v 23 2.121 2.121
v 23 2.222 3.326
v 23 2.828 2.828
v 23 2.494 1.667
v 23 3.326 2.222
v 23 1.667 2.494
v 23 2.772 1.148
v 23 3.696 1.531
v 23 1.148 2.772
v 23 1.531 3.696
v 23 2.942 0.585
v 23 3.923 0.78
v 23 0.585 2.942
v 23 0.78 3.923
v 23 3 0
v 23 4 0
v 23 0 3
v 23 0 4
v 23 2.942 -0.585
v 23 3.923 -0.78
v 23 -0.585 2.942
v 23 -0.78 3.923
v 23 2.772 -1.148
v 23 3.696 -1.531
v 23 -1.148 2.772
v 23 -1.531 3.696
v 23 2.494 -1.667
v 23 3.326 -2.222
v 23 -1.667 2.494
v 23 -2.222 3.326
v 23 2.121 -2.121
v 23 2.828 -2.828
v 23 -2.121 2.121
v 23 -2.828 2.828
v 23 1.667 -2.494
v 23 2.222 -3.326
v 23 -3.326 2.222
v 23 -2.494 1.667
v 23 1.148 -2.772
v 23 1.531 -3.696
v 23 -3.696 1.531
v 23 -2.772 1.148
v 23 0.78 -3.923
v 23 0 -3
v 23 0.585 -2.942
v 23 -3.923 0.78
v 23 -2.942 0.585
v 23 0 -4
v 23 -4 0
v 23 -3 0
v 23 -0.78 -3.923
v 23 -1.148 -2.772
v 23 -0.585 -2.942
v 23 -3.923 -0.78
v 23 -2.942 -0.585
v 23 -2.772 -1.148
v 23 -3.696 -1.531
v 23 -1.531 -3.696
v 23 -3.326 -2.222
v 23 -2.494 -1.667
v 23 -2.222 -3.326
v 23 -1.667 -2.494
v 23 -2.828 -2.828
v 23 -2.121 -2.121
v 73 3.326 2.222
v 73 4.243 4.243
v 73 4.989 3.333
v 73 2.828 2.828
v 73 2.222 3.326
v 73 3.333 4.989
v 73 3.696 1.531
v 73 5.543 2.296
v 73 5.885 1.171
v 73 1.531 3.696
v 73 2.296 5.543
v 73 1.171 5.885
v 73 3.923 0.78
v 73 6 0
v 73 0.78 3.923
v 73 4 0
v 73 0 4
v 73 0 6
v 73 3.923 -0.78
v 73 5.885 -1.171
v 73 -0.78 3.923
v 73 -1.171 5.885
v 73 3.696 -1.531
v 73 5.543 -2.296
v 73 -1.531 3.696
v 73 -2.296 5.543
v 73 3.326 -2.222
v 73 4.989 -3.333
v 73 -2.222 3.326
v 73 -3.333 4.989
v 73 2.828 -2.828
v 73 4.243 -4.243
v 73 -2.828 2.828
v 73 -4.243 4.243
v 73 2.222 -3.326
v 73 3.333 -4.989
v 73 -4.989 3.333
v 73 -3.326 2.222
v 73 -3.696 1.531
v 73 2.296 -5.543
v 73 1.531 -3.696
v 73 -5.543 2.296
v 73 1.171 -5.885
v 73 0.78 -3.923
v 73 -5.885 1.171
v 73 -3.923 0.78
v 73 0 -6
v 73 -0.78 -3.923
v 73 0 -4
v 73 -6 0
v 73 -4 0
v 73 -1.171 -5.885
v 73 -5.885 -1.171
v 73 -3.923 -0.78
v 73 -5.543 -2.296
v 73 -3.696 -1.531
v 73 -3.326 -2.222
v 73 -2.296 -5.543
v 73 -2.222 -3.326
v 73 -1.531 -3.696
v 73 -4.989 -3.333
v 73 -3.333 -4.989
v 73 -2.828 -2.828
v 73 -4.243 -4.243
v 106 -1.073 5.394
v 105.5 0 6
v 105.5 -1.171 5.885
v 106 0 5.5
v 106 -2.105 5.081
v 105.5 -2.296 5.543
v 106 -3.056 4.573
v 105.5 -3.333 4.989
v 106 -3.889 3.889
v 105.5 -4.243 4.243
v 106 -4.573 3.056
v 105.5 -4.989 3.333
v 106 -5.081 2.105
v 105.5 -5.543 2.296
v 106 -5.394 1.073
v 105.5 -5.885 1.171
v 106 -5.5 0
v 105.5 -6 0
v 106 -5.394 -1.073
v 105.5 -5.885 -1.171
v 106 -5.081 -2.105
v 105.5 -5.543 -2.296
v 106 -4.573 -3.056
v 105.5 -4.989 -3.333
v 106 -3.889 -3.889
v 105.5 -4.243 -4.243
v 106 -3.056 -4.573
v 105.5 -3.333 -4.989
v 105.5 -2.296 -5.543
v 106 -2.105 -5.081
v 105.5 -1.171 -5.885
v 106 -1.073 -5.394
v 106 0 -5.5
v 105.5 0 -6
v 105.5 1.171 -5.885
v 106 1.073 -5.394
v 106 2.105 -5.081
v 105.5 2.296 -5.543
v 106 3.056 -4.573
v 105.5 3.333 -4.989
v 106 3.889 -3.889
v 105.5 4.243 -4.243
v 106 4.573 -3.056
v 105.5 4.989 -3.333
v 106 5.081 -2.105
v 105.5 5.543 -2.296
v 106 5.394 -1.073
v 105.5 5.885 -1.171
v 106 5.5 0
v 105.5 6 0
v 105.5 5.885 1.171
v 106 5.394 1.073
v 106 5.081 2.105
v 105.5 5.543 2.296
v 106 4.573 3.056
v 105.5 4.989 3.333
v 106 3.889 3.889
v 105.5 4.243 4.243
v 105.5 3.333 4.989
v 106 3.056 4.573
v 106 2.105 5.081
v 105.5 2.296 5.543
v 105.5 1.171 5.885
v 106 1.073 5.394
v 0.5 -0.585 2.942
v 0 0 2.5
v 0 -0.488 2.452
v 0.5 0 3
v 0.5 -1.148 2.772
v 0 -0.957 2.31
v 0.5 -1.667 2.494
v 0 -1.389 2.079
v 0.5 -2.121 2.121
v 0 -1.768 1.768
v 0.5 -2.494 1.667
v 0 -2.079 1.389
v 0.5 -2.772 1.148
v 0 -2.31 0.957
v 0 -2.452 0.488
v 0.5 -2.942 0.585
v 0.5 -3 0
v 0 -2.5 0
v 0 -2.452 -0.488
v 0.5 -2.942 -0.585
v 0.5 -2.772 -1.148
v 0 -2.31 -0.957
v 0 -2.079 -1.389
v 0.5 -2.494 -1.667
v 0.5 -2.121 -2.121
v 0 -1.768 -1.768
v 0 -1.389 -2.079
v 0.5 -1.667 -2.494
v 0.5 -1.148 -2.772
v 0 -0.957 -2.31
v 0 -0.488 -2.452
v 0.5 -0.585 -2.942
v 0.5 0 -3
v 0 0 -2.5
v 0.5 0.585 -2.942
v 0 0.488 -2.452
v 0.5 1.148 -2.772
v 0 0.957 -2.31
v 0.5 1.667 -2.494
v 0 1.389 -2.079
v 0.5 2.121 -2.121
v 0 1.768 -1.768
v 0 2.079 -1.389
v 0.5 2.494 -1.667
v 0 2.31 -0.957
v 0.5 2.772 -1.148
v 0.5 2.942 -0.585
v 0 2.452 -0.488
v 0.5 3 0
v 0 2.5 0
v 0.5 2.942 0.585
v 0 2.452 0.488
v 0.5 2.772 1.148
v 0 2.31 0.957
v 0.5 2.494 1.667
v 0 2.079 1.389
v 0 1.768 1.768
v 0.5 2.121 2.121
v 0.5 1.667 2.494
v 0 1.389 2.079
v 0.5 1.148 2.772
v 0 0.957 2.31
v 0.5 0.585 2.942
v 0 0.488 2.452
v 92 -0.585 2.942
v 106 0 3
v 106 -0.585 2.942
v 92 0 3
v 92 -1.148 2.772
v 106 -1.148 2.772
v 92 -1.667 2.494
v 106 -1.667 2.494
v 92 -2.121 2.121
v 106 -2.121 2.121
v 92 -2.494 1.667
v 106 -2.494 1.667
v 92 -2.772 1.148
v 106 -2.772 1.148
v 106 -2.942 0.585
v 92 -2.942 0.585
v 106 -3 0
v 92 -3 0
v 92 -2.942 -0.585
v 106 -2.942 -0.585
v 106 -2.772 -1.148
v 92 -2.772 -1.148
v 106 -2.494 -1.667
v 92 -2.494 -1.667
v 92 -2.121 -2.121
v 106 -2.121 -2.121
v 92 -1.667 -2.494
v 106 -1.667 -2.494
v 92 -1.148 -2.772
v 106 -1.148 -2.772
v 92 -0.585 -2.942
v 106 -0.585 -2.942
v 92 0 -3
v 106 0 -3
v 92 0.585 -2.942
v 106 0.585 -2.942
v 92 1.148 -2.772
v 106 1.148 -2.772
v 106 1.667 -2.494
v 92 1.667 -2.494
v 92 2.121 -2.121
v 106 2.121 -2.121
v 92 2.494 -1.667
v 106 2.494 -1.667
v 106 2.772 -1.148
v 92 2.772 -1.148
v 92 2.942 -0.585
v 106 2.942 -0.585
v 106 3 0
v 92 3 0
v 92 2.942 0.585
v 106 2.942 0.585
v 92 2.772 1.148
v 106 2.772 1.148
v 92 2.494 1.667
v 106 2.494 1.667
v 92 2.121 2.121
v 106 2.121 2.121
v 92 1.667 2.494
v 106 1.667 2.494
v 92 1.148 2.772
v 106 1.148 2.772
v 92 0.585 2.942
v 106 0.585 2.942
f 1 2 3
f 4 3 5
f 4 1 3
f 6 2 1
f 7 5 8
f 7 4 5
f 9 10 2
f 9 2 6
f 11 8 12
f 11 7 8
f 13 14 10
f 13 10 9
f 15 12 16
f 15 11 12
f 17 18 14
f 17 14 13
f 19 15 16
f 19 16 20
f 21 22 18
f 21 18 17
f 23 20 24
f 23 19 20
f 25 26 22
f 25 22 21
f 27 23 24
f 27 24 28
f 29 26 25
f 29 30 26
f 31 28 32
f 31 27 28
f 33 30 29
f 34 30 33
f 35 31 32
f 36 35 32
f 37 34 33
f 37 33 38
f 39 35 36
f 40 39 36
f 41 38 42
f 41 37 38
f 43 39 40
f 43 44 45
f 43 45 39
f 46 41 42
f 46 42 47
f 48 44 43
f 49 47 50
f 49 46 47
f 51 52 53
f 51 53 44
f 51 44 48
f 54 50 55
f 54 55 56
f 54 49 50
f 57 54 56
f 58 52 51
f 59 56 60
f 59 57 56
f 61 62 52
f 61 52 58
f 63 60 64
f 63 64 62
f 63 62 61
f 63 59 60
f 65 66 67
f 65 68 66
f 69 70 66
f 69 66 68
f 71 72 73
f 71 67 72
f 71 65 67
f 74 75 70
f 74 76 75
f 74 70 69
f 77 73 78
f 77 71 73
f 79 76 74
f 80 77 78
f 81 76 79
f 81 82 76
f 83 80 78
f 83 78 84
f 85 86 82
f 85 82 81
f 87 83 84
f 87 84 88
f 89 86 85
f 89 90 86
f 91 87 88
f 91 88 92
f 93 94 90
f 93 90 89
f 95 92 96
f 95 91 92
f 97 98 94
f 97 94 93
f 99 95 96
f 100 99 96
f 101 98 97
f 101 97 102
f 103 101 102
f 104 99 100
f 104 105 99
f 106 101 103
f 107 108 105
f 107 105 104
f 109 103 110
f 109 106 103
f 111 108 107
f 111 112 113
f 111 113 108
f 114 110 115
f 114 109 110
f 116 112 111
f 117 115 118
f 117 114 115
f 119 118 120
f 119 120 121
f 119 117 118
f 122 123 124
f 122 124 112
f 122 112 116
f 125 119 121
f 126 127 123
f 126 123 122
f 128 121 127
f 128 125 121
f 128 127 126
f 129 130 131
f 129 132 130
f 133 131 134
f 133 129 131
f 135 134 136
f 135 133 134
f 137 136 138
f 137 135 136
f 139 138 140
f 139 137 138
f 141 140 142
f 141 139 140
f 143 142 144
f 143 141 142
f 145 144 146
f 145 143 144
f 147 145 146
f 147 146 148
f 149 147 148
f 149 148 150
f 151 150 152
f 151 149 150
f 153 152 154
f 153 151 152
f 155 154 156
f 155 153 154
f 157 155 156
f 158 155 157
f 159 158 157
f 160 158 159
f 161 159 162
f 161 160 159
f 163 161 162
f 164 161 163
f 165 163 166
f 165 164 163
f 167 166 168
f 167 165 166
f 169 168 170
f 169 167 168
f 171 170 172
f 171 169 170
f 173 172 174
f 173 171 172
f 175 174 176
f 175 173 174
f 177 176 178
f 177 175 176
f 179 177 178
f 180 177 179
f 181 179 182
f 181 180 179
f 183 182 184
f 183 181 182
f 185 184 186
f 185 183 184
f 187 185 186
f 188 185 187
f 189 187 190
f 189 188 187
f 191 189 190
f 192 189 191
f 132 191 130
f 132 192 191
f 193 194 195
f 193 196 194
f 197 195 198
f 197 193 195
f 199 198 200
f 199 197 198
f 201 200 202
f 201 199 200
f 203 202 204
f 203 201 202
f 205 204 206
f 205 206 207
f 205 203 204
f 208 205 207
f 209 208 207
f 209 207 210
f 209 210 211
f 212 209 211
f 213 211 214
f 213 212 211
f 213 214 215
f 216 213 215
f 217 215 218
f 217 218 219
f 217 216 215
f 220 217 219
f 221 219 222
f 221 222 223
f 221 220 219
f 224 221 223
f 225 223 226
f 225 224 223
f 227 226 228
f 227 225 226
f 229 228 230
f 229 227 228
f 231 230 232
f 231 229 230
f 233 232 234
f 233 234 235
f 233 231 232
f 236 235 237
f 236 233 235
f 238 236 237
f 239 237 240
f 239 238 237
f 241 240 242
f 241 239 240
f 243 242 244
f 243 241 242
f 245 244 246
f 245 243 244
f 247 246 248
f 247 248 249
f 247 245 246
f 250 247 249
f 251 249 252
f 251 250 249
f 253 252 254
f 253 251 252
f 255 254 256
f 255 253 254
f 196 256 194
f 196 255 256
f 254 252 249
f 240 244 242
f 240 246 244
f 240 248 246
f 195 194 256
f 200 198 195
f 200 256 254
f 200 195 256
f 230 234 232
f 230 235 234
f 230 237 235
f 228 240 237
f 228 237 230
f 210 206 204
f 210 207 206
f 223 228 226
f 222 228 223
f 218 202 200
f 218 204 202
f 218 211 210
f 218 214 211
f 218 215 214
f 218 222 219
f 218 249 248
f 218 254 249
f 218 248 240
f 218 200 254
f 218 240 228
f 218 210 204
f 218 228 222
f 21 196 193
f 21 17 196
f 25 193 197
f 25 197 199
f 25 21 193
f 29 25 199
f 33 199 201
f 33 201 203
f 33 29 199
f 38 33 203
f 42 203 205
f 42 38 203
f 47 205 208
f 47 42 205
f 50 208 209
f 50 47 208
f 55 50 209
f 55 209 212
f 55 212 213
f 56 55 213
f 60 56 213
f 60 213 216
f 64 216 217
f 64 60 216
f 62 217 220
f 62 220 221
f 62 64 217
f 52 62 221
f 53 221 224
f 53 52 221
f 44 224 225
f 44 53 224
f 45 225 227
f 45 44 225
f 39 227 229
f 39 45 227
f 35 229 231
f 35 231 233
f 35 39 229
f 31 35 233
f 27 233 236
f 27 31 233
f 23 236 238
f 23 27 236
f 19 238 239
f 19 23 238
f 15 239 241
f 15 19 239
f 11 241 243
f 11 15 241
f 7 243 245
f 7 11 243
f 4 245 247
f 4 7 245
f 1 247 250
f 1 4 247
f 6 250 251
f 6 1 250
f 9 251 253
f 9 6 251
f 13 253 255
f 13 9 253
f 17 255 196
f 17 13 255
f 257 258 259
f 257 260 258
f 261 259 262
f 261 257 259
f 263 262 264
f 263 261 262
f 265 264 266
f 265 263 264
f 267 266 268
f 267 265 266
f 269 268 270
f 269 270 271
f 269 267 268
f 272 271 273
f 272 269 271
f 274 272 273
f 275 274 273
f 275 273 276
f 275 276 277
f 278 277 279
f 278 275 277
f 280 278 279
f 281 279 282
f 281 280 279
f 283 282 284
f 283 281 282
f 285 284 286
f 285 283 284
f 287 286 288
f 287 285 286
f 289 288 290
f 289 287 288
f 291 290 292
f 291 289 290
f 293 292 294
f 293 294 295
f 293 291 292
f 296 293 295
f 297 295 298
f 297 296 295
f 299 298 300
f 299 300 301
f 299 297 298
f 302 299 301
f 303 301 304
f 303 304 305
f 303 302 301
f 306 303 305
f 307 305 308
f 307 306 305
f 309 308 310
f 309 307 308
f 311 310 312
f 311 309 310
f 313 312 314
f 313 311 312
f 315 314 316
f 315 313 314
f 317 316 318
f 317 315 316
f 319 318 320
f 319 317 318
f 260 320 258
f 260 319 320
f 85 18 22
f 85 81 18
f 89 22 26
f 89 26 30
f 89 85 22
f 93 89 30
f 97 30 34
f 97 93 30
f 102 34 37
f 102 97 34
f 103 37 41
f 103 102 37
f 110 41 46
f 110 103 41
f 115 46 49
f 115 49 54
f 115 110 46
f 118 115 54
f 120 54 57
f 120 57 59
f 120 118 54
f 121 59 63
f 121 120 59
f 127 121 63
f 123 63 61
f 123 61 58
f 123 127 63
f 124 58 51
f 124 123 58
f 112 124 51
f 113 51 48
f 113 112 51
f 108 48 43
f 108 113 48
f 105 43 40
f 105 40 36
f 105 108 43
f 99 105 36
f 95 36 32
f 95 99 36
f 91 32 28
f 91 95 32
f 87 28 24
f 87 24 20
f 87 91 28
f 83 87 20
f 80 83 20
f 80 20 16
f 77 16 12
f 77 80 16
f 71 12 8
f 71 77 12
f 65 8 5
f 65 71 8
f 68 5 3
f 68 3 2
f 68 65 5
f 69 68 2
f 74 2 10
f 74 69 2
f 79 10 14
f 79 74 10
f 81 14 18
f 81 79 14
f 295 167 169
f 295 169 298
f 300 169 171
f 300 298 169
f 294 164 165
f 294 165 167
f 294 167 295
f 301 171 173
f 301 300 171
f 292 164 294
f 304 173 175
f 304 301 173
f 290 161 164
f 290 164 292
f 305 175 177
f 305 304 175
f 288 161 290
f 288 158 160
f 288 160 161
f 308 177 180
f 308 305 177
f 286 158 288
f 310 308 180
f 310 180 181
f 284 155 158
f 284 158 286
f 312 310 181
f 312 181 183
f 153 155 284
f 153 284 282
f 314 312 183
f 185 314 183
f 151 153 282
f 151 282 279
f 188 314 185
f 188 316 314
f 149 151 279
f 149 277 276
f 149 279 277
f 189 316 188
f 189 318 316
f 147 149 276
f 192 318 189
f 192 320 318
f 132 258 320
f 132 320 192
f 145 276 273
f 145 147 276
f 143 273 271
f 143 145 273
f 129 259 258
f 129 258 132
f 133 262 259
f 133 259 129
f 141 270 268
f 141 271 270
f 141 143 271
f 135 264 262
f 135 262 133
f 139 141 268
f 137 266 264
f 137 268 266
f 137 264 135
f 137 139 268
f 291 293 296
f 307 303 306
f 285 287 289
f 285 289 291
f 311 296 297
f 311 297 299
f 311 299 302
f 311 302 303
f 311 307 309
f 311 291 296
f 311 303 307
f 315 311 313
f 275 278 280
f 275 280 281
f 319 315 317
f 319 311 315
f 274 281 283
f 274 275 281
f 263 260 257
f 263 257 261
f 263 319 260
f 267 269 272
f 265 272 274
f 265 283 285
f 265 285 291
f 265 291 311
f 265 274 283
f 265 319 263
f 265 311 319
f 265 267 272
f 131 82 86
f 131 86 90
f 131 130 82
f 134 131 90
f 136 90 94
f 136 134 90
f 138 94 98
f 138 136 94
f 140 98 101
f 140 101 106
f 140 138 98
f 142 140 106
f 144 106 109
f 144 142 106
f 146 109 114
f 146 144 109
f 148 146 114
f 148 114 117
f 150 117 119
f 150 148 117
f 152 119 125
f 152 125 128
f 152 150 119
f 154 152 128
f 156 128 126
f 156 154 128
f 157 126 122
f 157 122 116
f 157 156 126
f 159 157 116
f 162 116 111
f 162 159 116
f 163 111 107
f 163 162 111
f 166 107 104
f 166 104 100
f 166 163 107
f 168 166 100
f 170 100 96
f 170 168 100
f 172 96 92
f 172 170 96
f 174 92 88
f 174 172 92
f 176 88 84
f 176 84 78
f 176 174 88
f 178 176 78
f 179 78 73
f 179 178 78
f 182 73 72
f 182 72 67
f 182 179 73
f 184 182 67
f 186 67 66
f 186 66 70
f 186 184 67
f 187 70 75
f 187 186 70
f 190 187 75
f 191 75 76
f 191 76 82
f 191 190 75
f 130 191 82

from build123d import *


with BuildPart() as part:
    # Sketch_Shaft_Profile → Shaft_Revolve_12x33_8x50_M6x23_TappedM6x14 (revolve)
    with BuildSketch(Plane.XY):
        Polygon((0, 0), (0, 2.5), (0.5, 3), (23, 3), (23, 4), (73, 4), (73, 6), (105.5, 6), (106, 5.5), (106, 3), (92, 3), (92, 0), align=None)
    revolve(axis=Axis((-5, 0, 0), (1, 0, 0)))


solid = part.part
